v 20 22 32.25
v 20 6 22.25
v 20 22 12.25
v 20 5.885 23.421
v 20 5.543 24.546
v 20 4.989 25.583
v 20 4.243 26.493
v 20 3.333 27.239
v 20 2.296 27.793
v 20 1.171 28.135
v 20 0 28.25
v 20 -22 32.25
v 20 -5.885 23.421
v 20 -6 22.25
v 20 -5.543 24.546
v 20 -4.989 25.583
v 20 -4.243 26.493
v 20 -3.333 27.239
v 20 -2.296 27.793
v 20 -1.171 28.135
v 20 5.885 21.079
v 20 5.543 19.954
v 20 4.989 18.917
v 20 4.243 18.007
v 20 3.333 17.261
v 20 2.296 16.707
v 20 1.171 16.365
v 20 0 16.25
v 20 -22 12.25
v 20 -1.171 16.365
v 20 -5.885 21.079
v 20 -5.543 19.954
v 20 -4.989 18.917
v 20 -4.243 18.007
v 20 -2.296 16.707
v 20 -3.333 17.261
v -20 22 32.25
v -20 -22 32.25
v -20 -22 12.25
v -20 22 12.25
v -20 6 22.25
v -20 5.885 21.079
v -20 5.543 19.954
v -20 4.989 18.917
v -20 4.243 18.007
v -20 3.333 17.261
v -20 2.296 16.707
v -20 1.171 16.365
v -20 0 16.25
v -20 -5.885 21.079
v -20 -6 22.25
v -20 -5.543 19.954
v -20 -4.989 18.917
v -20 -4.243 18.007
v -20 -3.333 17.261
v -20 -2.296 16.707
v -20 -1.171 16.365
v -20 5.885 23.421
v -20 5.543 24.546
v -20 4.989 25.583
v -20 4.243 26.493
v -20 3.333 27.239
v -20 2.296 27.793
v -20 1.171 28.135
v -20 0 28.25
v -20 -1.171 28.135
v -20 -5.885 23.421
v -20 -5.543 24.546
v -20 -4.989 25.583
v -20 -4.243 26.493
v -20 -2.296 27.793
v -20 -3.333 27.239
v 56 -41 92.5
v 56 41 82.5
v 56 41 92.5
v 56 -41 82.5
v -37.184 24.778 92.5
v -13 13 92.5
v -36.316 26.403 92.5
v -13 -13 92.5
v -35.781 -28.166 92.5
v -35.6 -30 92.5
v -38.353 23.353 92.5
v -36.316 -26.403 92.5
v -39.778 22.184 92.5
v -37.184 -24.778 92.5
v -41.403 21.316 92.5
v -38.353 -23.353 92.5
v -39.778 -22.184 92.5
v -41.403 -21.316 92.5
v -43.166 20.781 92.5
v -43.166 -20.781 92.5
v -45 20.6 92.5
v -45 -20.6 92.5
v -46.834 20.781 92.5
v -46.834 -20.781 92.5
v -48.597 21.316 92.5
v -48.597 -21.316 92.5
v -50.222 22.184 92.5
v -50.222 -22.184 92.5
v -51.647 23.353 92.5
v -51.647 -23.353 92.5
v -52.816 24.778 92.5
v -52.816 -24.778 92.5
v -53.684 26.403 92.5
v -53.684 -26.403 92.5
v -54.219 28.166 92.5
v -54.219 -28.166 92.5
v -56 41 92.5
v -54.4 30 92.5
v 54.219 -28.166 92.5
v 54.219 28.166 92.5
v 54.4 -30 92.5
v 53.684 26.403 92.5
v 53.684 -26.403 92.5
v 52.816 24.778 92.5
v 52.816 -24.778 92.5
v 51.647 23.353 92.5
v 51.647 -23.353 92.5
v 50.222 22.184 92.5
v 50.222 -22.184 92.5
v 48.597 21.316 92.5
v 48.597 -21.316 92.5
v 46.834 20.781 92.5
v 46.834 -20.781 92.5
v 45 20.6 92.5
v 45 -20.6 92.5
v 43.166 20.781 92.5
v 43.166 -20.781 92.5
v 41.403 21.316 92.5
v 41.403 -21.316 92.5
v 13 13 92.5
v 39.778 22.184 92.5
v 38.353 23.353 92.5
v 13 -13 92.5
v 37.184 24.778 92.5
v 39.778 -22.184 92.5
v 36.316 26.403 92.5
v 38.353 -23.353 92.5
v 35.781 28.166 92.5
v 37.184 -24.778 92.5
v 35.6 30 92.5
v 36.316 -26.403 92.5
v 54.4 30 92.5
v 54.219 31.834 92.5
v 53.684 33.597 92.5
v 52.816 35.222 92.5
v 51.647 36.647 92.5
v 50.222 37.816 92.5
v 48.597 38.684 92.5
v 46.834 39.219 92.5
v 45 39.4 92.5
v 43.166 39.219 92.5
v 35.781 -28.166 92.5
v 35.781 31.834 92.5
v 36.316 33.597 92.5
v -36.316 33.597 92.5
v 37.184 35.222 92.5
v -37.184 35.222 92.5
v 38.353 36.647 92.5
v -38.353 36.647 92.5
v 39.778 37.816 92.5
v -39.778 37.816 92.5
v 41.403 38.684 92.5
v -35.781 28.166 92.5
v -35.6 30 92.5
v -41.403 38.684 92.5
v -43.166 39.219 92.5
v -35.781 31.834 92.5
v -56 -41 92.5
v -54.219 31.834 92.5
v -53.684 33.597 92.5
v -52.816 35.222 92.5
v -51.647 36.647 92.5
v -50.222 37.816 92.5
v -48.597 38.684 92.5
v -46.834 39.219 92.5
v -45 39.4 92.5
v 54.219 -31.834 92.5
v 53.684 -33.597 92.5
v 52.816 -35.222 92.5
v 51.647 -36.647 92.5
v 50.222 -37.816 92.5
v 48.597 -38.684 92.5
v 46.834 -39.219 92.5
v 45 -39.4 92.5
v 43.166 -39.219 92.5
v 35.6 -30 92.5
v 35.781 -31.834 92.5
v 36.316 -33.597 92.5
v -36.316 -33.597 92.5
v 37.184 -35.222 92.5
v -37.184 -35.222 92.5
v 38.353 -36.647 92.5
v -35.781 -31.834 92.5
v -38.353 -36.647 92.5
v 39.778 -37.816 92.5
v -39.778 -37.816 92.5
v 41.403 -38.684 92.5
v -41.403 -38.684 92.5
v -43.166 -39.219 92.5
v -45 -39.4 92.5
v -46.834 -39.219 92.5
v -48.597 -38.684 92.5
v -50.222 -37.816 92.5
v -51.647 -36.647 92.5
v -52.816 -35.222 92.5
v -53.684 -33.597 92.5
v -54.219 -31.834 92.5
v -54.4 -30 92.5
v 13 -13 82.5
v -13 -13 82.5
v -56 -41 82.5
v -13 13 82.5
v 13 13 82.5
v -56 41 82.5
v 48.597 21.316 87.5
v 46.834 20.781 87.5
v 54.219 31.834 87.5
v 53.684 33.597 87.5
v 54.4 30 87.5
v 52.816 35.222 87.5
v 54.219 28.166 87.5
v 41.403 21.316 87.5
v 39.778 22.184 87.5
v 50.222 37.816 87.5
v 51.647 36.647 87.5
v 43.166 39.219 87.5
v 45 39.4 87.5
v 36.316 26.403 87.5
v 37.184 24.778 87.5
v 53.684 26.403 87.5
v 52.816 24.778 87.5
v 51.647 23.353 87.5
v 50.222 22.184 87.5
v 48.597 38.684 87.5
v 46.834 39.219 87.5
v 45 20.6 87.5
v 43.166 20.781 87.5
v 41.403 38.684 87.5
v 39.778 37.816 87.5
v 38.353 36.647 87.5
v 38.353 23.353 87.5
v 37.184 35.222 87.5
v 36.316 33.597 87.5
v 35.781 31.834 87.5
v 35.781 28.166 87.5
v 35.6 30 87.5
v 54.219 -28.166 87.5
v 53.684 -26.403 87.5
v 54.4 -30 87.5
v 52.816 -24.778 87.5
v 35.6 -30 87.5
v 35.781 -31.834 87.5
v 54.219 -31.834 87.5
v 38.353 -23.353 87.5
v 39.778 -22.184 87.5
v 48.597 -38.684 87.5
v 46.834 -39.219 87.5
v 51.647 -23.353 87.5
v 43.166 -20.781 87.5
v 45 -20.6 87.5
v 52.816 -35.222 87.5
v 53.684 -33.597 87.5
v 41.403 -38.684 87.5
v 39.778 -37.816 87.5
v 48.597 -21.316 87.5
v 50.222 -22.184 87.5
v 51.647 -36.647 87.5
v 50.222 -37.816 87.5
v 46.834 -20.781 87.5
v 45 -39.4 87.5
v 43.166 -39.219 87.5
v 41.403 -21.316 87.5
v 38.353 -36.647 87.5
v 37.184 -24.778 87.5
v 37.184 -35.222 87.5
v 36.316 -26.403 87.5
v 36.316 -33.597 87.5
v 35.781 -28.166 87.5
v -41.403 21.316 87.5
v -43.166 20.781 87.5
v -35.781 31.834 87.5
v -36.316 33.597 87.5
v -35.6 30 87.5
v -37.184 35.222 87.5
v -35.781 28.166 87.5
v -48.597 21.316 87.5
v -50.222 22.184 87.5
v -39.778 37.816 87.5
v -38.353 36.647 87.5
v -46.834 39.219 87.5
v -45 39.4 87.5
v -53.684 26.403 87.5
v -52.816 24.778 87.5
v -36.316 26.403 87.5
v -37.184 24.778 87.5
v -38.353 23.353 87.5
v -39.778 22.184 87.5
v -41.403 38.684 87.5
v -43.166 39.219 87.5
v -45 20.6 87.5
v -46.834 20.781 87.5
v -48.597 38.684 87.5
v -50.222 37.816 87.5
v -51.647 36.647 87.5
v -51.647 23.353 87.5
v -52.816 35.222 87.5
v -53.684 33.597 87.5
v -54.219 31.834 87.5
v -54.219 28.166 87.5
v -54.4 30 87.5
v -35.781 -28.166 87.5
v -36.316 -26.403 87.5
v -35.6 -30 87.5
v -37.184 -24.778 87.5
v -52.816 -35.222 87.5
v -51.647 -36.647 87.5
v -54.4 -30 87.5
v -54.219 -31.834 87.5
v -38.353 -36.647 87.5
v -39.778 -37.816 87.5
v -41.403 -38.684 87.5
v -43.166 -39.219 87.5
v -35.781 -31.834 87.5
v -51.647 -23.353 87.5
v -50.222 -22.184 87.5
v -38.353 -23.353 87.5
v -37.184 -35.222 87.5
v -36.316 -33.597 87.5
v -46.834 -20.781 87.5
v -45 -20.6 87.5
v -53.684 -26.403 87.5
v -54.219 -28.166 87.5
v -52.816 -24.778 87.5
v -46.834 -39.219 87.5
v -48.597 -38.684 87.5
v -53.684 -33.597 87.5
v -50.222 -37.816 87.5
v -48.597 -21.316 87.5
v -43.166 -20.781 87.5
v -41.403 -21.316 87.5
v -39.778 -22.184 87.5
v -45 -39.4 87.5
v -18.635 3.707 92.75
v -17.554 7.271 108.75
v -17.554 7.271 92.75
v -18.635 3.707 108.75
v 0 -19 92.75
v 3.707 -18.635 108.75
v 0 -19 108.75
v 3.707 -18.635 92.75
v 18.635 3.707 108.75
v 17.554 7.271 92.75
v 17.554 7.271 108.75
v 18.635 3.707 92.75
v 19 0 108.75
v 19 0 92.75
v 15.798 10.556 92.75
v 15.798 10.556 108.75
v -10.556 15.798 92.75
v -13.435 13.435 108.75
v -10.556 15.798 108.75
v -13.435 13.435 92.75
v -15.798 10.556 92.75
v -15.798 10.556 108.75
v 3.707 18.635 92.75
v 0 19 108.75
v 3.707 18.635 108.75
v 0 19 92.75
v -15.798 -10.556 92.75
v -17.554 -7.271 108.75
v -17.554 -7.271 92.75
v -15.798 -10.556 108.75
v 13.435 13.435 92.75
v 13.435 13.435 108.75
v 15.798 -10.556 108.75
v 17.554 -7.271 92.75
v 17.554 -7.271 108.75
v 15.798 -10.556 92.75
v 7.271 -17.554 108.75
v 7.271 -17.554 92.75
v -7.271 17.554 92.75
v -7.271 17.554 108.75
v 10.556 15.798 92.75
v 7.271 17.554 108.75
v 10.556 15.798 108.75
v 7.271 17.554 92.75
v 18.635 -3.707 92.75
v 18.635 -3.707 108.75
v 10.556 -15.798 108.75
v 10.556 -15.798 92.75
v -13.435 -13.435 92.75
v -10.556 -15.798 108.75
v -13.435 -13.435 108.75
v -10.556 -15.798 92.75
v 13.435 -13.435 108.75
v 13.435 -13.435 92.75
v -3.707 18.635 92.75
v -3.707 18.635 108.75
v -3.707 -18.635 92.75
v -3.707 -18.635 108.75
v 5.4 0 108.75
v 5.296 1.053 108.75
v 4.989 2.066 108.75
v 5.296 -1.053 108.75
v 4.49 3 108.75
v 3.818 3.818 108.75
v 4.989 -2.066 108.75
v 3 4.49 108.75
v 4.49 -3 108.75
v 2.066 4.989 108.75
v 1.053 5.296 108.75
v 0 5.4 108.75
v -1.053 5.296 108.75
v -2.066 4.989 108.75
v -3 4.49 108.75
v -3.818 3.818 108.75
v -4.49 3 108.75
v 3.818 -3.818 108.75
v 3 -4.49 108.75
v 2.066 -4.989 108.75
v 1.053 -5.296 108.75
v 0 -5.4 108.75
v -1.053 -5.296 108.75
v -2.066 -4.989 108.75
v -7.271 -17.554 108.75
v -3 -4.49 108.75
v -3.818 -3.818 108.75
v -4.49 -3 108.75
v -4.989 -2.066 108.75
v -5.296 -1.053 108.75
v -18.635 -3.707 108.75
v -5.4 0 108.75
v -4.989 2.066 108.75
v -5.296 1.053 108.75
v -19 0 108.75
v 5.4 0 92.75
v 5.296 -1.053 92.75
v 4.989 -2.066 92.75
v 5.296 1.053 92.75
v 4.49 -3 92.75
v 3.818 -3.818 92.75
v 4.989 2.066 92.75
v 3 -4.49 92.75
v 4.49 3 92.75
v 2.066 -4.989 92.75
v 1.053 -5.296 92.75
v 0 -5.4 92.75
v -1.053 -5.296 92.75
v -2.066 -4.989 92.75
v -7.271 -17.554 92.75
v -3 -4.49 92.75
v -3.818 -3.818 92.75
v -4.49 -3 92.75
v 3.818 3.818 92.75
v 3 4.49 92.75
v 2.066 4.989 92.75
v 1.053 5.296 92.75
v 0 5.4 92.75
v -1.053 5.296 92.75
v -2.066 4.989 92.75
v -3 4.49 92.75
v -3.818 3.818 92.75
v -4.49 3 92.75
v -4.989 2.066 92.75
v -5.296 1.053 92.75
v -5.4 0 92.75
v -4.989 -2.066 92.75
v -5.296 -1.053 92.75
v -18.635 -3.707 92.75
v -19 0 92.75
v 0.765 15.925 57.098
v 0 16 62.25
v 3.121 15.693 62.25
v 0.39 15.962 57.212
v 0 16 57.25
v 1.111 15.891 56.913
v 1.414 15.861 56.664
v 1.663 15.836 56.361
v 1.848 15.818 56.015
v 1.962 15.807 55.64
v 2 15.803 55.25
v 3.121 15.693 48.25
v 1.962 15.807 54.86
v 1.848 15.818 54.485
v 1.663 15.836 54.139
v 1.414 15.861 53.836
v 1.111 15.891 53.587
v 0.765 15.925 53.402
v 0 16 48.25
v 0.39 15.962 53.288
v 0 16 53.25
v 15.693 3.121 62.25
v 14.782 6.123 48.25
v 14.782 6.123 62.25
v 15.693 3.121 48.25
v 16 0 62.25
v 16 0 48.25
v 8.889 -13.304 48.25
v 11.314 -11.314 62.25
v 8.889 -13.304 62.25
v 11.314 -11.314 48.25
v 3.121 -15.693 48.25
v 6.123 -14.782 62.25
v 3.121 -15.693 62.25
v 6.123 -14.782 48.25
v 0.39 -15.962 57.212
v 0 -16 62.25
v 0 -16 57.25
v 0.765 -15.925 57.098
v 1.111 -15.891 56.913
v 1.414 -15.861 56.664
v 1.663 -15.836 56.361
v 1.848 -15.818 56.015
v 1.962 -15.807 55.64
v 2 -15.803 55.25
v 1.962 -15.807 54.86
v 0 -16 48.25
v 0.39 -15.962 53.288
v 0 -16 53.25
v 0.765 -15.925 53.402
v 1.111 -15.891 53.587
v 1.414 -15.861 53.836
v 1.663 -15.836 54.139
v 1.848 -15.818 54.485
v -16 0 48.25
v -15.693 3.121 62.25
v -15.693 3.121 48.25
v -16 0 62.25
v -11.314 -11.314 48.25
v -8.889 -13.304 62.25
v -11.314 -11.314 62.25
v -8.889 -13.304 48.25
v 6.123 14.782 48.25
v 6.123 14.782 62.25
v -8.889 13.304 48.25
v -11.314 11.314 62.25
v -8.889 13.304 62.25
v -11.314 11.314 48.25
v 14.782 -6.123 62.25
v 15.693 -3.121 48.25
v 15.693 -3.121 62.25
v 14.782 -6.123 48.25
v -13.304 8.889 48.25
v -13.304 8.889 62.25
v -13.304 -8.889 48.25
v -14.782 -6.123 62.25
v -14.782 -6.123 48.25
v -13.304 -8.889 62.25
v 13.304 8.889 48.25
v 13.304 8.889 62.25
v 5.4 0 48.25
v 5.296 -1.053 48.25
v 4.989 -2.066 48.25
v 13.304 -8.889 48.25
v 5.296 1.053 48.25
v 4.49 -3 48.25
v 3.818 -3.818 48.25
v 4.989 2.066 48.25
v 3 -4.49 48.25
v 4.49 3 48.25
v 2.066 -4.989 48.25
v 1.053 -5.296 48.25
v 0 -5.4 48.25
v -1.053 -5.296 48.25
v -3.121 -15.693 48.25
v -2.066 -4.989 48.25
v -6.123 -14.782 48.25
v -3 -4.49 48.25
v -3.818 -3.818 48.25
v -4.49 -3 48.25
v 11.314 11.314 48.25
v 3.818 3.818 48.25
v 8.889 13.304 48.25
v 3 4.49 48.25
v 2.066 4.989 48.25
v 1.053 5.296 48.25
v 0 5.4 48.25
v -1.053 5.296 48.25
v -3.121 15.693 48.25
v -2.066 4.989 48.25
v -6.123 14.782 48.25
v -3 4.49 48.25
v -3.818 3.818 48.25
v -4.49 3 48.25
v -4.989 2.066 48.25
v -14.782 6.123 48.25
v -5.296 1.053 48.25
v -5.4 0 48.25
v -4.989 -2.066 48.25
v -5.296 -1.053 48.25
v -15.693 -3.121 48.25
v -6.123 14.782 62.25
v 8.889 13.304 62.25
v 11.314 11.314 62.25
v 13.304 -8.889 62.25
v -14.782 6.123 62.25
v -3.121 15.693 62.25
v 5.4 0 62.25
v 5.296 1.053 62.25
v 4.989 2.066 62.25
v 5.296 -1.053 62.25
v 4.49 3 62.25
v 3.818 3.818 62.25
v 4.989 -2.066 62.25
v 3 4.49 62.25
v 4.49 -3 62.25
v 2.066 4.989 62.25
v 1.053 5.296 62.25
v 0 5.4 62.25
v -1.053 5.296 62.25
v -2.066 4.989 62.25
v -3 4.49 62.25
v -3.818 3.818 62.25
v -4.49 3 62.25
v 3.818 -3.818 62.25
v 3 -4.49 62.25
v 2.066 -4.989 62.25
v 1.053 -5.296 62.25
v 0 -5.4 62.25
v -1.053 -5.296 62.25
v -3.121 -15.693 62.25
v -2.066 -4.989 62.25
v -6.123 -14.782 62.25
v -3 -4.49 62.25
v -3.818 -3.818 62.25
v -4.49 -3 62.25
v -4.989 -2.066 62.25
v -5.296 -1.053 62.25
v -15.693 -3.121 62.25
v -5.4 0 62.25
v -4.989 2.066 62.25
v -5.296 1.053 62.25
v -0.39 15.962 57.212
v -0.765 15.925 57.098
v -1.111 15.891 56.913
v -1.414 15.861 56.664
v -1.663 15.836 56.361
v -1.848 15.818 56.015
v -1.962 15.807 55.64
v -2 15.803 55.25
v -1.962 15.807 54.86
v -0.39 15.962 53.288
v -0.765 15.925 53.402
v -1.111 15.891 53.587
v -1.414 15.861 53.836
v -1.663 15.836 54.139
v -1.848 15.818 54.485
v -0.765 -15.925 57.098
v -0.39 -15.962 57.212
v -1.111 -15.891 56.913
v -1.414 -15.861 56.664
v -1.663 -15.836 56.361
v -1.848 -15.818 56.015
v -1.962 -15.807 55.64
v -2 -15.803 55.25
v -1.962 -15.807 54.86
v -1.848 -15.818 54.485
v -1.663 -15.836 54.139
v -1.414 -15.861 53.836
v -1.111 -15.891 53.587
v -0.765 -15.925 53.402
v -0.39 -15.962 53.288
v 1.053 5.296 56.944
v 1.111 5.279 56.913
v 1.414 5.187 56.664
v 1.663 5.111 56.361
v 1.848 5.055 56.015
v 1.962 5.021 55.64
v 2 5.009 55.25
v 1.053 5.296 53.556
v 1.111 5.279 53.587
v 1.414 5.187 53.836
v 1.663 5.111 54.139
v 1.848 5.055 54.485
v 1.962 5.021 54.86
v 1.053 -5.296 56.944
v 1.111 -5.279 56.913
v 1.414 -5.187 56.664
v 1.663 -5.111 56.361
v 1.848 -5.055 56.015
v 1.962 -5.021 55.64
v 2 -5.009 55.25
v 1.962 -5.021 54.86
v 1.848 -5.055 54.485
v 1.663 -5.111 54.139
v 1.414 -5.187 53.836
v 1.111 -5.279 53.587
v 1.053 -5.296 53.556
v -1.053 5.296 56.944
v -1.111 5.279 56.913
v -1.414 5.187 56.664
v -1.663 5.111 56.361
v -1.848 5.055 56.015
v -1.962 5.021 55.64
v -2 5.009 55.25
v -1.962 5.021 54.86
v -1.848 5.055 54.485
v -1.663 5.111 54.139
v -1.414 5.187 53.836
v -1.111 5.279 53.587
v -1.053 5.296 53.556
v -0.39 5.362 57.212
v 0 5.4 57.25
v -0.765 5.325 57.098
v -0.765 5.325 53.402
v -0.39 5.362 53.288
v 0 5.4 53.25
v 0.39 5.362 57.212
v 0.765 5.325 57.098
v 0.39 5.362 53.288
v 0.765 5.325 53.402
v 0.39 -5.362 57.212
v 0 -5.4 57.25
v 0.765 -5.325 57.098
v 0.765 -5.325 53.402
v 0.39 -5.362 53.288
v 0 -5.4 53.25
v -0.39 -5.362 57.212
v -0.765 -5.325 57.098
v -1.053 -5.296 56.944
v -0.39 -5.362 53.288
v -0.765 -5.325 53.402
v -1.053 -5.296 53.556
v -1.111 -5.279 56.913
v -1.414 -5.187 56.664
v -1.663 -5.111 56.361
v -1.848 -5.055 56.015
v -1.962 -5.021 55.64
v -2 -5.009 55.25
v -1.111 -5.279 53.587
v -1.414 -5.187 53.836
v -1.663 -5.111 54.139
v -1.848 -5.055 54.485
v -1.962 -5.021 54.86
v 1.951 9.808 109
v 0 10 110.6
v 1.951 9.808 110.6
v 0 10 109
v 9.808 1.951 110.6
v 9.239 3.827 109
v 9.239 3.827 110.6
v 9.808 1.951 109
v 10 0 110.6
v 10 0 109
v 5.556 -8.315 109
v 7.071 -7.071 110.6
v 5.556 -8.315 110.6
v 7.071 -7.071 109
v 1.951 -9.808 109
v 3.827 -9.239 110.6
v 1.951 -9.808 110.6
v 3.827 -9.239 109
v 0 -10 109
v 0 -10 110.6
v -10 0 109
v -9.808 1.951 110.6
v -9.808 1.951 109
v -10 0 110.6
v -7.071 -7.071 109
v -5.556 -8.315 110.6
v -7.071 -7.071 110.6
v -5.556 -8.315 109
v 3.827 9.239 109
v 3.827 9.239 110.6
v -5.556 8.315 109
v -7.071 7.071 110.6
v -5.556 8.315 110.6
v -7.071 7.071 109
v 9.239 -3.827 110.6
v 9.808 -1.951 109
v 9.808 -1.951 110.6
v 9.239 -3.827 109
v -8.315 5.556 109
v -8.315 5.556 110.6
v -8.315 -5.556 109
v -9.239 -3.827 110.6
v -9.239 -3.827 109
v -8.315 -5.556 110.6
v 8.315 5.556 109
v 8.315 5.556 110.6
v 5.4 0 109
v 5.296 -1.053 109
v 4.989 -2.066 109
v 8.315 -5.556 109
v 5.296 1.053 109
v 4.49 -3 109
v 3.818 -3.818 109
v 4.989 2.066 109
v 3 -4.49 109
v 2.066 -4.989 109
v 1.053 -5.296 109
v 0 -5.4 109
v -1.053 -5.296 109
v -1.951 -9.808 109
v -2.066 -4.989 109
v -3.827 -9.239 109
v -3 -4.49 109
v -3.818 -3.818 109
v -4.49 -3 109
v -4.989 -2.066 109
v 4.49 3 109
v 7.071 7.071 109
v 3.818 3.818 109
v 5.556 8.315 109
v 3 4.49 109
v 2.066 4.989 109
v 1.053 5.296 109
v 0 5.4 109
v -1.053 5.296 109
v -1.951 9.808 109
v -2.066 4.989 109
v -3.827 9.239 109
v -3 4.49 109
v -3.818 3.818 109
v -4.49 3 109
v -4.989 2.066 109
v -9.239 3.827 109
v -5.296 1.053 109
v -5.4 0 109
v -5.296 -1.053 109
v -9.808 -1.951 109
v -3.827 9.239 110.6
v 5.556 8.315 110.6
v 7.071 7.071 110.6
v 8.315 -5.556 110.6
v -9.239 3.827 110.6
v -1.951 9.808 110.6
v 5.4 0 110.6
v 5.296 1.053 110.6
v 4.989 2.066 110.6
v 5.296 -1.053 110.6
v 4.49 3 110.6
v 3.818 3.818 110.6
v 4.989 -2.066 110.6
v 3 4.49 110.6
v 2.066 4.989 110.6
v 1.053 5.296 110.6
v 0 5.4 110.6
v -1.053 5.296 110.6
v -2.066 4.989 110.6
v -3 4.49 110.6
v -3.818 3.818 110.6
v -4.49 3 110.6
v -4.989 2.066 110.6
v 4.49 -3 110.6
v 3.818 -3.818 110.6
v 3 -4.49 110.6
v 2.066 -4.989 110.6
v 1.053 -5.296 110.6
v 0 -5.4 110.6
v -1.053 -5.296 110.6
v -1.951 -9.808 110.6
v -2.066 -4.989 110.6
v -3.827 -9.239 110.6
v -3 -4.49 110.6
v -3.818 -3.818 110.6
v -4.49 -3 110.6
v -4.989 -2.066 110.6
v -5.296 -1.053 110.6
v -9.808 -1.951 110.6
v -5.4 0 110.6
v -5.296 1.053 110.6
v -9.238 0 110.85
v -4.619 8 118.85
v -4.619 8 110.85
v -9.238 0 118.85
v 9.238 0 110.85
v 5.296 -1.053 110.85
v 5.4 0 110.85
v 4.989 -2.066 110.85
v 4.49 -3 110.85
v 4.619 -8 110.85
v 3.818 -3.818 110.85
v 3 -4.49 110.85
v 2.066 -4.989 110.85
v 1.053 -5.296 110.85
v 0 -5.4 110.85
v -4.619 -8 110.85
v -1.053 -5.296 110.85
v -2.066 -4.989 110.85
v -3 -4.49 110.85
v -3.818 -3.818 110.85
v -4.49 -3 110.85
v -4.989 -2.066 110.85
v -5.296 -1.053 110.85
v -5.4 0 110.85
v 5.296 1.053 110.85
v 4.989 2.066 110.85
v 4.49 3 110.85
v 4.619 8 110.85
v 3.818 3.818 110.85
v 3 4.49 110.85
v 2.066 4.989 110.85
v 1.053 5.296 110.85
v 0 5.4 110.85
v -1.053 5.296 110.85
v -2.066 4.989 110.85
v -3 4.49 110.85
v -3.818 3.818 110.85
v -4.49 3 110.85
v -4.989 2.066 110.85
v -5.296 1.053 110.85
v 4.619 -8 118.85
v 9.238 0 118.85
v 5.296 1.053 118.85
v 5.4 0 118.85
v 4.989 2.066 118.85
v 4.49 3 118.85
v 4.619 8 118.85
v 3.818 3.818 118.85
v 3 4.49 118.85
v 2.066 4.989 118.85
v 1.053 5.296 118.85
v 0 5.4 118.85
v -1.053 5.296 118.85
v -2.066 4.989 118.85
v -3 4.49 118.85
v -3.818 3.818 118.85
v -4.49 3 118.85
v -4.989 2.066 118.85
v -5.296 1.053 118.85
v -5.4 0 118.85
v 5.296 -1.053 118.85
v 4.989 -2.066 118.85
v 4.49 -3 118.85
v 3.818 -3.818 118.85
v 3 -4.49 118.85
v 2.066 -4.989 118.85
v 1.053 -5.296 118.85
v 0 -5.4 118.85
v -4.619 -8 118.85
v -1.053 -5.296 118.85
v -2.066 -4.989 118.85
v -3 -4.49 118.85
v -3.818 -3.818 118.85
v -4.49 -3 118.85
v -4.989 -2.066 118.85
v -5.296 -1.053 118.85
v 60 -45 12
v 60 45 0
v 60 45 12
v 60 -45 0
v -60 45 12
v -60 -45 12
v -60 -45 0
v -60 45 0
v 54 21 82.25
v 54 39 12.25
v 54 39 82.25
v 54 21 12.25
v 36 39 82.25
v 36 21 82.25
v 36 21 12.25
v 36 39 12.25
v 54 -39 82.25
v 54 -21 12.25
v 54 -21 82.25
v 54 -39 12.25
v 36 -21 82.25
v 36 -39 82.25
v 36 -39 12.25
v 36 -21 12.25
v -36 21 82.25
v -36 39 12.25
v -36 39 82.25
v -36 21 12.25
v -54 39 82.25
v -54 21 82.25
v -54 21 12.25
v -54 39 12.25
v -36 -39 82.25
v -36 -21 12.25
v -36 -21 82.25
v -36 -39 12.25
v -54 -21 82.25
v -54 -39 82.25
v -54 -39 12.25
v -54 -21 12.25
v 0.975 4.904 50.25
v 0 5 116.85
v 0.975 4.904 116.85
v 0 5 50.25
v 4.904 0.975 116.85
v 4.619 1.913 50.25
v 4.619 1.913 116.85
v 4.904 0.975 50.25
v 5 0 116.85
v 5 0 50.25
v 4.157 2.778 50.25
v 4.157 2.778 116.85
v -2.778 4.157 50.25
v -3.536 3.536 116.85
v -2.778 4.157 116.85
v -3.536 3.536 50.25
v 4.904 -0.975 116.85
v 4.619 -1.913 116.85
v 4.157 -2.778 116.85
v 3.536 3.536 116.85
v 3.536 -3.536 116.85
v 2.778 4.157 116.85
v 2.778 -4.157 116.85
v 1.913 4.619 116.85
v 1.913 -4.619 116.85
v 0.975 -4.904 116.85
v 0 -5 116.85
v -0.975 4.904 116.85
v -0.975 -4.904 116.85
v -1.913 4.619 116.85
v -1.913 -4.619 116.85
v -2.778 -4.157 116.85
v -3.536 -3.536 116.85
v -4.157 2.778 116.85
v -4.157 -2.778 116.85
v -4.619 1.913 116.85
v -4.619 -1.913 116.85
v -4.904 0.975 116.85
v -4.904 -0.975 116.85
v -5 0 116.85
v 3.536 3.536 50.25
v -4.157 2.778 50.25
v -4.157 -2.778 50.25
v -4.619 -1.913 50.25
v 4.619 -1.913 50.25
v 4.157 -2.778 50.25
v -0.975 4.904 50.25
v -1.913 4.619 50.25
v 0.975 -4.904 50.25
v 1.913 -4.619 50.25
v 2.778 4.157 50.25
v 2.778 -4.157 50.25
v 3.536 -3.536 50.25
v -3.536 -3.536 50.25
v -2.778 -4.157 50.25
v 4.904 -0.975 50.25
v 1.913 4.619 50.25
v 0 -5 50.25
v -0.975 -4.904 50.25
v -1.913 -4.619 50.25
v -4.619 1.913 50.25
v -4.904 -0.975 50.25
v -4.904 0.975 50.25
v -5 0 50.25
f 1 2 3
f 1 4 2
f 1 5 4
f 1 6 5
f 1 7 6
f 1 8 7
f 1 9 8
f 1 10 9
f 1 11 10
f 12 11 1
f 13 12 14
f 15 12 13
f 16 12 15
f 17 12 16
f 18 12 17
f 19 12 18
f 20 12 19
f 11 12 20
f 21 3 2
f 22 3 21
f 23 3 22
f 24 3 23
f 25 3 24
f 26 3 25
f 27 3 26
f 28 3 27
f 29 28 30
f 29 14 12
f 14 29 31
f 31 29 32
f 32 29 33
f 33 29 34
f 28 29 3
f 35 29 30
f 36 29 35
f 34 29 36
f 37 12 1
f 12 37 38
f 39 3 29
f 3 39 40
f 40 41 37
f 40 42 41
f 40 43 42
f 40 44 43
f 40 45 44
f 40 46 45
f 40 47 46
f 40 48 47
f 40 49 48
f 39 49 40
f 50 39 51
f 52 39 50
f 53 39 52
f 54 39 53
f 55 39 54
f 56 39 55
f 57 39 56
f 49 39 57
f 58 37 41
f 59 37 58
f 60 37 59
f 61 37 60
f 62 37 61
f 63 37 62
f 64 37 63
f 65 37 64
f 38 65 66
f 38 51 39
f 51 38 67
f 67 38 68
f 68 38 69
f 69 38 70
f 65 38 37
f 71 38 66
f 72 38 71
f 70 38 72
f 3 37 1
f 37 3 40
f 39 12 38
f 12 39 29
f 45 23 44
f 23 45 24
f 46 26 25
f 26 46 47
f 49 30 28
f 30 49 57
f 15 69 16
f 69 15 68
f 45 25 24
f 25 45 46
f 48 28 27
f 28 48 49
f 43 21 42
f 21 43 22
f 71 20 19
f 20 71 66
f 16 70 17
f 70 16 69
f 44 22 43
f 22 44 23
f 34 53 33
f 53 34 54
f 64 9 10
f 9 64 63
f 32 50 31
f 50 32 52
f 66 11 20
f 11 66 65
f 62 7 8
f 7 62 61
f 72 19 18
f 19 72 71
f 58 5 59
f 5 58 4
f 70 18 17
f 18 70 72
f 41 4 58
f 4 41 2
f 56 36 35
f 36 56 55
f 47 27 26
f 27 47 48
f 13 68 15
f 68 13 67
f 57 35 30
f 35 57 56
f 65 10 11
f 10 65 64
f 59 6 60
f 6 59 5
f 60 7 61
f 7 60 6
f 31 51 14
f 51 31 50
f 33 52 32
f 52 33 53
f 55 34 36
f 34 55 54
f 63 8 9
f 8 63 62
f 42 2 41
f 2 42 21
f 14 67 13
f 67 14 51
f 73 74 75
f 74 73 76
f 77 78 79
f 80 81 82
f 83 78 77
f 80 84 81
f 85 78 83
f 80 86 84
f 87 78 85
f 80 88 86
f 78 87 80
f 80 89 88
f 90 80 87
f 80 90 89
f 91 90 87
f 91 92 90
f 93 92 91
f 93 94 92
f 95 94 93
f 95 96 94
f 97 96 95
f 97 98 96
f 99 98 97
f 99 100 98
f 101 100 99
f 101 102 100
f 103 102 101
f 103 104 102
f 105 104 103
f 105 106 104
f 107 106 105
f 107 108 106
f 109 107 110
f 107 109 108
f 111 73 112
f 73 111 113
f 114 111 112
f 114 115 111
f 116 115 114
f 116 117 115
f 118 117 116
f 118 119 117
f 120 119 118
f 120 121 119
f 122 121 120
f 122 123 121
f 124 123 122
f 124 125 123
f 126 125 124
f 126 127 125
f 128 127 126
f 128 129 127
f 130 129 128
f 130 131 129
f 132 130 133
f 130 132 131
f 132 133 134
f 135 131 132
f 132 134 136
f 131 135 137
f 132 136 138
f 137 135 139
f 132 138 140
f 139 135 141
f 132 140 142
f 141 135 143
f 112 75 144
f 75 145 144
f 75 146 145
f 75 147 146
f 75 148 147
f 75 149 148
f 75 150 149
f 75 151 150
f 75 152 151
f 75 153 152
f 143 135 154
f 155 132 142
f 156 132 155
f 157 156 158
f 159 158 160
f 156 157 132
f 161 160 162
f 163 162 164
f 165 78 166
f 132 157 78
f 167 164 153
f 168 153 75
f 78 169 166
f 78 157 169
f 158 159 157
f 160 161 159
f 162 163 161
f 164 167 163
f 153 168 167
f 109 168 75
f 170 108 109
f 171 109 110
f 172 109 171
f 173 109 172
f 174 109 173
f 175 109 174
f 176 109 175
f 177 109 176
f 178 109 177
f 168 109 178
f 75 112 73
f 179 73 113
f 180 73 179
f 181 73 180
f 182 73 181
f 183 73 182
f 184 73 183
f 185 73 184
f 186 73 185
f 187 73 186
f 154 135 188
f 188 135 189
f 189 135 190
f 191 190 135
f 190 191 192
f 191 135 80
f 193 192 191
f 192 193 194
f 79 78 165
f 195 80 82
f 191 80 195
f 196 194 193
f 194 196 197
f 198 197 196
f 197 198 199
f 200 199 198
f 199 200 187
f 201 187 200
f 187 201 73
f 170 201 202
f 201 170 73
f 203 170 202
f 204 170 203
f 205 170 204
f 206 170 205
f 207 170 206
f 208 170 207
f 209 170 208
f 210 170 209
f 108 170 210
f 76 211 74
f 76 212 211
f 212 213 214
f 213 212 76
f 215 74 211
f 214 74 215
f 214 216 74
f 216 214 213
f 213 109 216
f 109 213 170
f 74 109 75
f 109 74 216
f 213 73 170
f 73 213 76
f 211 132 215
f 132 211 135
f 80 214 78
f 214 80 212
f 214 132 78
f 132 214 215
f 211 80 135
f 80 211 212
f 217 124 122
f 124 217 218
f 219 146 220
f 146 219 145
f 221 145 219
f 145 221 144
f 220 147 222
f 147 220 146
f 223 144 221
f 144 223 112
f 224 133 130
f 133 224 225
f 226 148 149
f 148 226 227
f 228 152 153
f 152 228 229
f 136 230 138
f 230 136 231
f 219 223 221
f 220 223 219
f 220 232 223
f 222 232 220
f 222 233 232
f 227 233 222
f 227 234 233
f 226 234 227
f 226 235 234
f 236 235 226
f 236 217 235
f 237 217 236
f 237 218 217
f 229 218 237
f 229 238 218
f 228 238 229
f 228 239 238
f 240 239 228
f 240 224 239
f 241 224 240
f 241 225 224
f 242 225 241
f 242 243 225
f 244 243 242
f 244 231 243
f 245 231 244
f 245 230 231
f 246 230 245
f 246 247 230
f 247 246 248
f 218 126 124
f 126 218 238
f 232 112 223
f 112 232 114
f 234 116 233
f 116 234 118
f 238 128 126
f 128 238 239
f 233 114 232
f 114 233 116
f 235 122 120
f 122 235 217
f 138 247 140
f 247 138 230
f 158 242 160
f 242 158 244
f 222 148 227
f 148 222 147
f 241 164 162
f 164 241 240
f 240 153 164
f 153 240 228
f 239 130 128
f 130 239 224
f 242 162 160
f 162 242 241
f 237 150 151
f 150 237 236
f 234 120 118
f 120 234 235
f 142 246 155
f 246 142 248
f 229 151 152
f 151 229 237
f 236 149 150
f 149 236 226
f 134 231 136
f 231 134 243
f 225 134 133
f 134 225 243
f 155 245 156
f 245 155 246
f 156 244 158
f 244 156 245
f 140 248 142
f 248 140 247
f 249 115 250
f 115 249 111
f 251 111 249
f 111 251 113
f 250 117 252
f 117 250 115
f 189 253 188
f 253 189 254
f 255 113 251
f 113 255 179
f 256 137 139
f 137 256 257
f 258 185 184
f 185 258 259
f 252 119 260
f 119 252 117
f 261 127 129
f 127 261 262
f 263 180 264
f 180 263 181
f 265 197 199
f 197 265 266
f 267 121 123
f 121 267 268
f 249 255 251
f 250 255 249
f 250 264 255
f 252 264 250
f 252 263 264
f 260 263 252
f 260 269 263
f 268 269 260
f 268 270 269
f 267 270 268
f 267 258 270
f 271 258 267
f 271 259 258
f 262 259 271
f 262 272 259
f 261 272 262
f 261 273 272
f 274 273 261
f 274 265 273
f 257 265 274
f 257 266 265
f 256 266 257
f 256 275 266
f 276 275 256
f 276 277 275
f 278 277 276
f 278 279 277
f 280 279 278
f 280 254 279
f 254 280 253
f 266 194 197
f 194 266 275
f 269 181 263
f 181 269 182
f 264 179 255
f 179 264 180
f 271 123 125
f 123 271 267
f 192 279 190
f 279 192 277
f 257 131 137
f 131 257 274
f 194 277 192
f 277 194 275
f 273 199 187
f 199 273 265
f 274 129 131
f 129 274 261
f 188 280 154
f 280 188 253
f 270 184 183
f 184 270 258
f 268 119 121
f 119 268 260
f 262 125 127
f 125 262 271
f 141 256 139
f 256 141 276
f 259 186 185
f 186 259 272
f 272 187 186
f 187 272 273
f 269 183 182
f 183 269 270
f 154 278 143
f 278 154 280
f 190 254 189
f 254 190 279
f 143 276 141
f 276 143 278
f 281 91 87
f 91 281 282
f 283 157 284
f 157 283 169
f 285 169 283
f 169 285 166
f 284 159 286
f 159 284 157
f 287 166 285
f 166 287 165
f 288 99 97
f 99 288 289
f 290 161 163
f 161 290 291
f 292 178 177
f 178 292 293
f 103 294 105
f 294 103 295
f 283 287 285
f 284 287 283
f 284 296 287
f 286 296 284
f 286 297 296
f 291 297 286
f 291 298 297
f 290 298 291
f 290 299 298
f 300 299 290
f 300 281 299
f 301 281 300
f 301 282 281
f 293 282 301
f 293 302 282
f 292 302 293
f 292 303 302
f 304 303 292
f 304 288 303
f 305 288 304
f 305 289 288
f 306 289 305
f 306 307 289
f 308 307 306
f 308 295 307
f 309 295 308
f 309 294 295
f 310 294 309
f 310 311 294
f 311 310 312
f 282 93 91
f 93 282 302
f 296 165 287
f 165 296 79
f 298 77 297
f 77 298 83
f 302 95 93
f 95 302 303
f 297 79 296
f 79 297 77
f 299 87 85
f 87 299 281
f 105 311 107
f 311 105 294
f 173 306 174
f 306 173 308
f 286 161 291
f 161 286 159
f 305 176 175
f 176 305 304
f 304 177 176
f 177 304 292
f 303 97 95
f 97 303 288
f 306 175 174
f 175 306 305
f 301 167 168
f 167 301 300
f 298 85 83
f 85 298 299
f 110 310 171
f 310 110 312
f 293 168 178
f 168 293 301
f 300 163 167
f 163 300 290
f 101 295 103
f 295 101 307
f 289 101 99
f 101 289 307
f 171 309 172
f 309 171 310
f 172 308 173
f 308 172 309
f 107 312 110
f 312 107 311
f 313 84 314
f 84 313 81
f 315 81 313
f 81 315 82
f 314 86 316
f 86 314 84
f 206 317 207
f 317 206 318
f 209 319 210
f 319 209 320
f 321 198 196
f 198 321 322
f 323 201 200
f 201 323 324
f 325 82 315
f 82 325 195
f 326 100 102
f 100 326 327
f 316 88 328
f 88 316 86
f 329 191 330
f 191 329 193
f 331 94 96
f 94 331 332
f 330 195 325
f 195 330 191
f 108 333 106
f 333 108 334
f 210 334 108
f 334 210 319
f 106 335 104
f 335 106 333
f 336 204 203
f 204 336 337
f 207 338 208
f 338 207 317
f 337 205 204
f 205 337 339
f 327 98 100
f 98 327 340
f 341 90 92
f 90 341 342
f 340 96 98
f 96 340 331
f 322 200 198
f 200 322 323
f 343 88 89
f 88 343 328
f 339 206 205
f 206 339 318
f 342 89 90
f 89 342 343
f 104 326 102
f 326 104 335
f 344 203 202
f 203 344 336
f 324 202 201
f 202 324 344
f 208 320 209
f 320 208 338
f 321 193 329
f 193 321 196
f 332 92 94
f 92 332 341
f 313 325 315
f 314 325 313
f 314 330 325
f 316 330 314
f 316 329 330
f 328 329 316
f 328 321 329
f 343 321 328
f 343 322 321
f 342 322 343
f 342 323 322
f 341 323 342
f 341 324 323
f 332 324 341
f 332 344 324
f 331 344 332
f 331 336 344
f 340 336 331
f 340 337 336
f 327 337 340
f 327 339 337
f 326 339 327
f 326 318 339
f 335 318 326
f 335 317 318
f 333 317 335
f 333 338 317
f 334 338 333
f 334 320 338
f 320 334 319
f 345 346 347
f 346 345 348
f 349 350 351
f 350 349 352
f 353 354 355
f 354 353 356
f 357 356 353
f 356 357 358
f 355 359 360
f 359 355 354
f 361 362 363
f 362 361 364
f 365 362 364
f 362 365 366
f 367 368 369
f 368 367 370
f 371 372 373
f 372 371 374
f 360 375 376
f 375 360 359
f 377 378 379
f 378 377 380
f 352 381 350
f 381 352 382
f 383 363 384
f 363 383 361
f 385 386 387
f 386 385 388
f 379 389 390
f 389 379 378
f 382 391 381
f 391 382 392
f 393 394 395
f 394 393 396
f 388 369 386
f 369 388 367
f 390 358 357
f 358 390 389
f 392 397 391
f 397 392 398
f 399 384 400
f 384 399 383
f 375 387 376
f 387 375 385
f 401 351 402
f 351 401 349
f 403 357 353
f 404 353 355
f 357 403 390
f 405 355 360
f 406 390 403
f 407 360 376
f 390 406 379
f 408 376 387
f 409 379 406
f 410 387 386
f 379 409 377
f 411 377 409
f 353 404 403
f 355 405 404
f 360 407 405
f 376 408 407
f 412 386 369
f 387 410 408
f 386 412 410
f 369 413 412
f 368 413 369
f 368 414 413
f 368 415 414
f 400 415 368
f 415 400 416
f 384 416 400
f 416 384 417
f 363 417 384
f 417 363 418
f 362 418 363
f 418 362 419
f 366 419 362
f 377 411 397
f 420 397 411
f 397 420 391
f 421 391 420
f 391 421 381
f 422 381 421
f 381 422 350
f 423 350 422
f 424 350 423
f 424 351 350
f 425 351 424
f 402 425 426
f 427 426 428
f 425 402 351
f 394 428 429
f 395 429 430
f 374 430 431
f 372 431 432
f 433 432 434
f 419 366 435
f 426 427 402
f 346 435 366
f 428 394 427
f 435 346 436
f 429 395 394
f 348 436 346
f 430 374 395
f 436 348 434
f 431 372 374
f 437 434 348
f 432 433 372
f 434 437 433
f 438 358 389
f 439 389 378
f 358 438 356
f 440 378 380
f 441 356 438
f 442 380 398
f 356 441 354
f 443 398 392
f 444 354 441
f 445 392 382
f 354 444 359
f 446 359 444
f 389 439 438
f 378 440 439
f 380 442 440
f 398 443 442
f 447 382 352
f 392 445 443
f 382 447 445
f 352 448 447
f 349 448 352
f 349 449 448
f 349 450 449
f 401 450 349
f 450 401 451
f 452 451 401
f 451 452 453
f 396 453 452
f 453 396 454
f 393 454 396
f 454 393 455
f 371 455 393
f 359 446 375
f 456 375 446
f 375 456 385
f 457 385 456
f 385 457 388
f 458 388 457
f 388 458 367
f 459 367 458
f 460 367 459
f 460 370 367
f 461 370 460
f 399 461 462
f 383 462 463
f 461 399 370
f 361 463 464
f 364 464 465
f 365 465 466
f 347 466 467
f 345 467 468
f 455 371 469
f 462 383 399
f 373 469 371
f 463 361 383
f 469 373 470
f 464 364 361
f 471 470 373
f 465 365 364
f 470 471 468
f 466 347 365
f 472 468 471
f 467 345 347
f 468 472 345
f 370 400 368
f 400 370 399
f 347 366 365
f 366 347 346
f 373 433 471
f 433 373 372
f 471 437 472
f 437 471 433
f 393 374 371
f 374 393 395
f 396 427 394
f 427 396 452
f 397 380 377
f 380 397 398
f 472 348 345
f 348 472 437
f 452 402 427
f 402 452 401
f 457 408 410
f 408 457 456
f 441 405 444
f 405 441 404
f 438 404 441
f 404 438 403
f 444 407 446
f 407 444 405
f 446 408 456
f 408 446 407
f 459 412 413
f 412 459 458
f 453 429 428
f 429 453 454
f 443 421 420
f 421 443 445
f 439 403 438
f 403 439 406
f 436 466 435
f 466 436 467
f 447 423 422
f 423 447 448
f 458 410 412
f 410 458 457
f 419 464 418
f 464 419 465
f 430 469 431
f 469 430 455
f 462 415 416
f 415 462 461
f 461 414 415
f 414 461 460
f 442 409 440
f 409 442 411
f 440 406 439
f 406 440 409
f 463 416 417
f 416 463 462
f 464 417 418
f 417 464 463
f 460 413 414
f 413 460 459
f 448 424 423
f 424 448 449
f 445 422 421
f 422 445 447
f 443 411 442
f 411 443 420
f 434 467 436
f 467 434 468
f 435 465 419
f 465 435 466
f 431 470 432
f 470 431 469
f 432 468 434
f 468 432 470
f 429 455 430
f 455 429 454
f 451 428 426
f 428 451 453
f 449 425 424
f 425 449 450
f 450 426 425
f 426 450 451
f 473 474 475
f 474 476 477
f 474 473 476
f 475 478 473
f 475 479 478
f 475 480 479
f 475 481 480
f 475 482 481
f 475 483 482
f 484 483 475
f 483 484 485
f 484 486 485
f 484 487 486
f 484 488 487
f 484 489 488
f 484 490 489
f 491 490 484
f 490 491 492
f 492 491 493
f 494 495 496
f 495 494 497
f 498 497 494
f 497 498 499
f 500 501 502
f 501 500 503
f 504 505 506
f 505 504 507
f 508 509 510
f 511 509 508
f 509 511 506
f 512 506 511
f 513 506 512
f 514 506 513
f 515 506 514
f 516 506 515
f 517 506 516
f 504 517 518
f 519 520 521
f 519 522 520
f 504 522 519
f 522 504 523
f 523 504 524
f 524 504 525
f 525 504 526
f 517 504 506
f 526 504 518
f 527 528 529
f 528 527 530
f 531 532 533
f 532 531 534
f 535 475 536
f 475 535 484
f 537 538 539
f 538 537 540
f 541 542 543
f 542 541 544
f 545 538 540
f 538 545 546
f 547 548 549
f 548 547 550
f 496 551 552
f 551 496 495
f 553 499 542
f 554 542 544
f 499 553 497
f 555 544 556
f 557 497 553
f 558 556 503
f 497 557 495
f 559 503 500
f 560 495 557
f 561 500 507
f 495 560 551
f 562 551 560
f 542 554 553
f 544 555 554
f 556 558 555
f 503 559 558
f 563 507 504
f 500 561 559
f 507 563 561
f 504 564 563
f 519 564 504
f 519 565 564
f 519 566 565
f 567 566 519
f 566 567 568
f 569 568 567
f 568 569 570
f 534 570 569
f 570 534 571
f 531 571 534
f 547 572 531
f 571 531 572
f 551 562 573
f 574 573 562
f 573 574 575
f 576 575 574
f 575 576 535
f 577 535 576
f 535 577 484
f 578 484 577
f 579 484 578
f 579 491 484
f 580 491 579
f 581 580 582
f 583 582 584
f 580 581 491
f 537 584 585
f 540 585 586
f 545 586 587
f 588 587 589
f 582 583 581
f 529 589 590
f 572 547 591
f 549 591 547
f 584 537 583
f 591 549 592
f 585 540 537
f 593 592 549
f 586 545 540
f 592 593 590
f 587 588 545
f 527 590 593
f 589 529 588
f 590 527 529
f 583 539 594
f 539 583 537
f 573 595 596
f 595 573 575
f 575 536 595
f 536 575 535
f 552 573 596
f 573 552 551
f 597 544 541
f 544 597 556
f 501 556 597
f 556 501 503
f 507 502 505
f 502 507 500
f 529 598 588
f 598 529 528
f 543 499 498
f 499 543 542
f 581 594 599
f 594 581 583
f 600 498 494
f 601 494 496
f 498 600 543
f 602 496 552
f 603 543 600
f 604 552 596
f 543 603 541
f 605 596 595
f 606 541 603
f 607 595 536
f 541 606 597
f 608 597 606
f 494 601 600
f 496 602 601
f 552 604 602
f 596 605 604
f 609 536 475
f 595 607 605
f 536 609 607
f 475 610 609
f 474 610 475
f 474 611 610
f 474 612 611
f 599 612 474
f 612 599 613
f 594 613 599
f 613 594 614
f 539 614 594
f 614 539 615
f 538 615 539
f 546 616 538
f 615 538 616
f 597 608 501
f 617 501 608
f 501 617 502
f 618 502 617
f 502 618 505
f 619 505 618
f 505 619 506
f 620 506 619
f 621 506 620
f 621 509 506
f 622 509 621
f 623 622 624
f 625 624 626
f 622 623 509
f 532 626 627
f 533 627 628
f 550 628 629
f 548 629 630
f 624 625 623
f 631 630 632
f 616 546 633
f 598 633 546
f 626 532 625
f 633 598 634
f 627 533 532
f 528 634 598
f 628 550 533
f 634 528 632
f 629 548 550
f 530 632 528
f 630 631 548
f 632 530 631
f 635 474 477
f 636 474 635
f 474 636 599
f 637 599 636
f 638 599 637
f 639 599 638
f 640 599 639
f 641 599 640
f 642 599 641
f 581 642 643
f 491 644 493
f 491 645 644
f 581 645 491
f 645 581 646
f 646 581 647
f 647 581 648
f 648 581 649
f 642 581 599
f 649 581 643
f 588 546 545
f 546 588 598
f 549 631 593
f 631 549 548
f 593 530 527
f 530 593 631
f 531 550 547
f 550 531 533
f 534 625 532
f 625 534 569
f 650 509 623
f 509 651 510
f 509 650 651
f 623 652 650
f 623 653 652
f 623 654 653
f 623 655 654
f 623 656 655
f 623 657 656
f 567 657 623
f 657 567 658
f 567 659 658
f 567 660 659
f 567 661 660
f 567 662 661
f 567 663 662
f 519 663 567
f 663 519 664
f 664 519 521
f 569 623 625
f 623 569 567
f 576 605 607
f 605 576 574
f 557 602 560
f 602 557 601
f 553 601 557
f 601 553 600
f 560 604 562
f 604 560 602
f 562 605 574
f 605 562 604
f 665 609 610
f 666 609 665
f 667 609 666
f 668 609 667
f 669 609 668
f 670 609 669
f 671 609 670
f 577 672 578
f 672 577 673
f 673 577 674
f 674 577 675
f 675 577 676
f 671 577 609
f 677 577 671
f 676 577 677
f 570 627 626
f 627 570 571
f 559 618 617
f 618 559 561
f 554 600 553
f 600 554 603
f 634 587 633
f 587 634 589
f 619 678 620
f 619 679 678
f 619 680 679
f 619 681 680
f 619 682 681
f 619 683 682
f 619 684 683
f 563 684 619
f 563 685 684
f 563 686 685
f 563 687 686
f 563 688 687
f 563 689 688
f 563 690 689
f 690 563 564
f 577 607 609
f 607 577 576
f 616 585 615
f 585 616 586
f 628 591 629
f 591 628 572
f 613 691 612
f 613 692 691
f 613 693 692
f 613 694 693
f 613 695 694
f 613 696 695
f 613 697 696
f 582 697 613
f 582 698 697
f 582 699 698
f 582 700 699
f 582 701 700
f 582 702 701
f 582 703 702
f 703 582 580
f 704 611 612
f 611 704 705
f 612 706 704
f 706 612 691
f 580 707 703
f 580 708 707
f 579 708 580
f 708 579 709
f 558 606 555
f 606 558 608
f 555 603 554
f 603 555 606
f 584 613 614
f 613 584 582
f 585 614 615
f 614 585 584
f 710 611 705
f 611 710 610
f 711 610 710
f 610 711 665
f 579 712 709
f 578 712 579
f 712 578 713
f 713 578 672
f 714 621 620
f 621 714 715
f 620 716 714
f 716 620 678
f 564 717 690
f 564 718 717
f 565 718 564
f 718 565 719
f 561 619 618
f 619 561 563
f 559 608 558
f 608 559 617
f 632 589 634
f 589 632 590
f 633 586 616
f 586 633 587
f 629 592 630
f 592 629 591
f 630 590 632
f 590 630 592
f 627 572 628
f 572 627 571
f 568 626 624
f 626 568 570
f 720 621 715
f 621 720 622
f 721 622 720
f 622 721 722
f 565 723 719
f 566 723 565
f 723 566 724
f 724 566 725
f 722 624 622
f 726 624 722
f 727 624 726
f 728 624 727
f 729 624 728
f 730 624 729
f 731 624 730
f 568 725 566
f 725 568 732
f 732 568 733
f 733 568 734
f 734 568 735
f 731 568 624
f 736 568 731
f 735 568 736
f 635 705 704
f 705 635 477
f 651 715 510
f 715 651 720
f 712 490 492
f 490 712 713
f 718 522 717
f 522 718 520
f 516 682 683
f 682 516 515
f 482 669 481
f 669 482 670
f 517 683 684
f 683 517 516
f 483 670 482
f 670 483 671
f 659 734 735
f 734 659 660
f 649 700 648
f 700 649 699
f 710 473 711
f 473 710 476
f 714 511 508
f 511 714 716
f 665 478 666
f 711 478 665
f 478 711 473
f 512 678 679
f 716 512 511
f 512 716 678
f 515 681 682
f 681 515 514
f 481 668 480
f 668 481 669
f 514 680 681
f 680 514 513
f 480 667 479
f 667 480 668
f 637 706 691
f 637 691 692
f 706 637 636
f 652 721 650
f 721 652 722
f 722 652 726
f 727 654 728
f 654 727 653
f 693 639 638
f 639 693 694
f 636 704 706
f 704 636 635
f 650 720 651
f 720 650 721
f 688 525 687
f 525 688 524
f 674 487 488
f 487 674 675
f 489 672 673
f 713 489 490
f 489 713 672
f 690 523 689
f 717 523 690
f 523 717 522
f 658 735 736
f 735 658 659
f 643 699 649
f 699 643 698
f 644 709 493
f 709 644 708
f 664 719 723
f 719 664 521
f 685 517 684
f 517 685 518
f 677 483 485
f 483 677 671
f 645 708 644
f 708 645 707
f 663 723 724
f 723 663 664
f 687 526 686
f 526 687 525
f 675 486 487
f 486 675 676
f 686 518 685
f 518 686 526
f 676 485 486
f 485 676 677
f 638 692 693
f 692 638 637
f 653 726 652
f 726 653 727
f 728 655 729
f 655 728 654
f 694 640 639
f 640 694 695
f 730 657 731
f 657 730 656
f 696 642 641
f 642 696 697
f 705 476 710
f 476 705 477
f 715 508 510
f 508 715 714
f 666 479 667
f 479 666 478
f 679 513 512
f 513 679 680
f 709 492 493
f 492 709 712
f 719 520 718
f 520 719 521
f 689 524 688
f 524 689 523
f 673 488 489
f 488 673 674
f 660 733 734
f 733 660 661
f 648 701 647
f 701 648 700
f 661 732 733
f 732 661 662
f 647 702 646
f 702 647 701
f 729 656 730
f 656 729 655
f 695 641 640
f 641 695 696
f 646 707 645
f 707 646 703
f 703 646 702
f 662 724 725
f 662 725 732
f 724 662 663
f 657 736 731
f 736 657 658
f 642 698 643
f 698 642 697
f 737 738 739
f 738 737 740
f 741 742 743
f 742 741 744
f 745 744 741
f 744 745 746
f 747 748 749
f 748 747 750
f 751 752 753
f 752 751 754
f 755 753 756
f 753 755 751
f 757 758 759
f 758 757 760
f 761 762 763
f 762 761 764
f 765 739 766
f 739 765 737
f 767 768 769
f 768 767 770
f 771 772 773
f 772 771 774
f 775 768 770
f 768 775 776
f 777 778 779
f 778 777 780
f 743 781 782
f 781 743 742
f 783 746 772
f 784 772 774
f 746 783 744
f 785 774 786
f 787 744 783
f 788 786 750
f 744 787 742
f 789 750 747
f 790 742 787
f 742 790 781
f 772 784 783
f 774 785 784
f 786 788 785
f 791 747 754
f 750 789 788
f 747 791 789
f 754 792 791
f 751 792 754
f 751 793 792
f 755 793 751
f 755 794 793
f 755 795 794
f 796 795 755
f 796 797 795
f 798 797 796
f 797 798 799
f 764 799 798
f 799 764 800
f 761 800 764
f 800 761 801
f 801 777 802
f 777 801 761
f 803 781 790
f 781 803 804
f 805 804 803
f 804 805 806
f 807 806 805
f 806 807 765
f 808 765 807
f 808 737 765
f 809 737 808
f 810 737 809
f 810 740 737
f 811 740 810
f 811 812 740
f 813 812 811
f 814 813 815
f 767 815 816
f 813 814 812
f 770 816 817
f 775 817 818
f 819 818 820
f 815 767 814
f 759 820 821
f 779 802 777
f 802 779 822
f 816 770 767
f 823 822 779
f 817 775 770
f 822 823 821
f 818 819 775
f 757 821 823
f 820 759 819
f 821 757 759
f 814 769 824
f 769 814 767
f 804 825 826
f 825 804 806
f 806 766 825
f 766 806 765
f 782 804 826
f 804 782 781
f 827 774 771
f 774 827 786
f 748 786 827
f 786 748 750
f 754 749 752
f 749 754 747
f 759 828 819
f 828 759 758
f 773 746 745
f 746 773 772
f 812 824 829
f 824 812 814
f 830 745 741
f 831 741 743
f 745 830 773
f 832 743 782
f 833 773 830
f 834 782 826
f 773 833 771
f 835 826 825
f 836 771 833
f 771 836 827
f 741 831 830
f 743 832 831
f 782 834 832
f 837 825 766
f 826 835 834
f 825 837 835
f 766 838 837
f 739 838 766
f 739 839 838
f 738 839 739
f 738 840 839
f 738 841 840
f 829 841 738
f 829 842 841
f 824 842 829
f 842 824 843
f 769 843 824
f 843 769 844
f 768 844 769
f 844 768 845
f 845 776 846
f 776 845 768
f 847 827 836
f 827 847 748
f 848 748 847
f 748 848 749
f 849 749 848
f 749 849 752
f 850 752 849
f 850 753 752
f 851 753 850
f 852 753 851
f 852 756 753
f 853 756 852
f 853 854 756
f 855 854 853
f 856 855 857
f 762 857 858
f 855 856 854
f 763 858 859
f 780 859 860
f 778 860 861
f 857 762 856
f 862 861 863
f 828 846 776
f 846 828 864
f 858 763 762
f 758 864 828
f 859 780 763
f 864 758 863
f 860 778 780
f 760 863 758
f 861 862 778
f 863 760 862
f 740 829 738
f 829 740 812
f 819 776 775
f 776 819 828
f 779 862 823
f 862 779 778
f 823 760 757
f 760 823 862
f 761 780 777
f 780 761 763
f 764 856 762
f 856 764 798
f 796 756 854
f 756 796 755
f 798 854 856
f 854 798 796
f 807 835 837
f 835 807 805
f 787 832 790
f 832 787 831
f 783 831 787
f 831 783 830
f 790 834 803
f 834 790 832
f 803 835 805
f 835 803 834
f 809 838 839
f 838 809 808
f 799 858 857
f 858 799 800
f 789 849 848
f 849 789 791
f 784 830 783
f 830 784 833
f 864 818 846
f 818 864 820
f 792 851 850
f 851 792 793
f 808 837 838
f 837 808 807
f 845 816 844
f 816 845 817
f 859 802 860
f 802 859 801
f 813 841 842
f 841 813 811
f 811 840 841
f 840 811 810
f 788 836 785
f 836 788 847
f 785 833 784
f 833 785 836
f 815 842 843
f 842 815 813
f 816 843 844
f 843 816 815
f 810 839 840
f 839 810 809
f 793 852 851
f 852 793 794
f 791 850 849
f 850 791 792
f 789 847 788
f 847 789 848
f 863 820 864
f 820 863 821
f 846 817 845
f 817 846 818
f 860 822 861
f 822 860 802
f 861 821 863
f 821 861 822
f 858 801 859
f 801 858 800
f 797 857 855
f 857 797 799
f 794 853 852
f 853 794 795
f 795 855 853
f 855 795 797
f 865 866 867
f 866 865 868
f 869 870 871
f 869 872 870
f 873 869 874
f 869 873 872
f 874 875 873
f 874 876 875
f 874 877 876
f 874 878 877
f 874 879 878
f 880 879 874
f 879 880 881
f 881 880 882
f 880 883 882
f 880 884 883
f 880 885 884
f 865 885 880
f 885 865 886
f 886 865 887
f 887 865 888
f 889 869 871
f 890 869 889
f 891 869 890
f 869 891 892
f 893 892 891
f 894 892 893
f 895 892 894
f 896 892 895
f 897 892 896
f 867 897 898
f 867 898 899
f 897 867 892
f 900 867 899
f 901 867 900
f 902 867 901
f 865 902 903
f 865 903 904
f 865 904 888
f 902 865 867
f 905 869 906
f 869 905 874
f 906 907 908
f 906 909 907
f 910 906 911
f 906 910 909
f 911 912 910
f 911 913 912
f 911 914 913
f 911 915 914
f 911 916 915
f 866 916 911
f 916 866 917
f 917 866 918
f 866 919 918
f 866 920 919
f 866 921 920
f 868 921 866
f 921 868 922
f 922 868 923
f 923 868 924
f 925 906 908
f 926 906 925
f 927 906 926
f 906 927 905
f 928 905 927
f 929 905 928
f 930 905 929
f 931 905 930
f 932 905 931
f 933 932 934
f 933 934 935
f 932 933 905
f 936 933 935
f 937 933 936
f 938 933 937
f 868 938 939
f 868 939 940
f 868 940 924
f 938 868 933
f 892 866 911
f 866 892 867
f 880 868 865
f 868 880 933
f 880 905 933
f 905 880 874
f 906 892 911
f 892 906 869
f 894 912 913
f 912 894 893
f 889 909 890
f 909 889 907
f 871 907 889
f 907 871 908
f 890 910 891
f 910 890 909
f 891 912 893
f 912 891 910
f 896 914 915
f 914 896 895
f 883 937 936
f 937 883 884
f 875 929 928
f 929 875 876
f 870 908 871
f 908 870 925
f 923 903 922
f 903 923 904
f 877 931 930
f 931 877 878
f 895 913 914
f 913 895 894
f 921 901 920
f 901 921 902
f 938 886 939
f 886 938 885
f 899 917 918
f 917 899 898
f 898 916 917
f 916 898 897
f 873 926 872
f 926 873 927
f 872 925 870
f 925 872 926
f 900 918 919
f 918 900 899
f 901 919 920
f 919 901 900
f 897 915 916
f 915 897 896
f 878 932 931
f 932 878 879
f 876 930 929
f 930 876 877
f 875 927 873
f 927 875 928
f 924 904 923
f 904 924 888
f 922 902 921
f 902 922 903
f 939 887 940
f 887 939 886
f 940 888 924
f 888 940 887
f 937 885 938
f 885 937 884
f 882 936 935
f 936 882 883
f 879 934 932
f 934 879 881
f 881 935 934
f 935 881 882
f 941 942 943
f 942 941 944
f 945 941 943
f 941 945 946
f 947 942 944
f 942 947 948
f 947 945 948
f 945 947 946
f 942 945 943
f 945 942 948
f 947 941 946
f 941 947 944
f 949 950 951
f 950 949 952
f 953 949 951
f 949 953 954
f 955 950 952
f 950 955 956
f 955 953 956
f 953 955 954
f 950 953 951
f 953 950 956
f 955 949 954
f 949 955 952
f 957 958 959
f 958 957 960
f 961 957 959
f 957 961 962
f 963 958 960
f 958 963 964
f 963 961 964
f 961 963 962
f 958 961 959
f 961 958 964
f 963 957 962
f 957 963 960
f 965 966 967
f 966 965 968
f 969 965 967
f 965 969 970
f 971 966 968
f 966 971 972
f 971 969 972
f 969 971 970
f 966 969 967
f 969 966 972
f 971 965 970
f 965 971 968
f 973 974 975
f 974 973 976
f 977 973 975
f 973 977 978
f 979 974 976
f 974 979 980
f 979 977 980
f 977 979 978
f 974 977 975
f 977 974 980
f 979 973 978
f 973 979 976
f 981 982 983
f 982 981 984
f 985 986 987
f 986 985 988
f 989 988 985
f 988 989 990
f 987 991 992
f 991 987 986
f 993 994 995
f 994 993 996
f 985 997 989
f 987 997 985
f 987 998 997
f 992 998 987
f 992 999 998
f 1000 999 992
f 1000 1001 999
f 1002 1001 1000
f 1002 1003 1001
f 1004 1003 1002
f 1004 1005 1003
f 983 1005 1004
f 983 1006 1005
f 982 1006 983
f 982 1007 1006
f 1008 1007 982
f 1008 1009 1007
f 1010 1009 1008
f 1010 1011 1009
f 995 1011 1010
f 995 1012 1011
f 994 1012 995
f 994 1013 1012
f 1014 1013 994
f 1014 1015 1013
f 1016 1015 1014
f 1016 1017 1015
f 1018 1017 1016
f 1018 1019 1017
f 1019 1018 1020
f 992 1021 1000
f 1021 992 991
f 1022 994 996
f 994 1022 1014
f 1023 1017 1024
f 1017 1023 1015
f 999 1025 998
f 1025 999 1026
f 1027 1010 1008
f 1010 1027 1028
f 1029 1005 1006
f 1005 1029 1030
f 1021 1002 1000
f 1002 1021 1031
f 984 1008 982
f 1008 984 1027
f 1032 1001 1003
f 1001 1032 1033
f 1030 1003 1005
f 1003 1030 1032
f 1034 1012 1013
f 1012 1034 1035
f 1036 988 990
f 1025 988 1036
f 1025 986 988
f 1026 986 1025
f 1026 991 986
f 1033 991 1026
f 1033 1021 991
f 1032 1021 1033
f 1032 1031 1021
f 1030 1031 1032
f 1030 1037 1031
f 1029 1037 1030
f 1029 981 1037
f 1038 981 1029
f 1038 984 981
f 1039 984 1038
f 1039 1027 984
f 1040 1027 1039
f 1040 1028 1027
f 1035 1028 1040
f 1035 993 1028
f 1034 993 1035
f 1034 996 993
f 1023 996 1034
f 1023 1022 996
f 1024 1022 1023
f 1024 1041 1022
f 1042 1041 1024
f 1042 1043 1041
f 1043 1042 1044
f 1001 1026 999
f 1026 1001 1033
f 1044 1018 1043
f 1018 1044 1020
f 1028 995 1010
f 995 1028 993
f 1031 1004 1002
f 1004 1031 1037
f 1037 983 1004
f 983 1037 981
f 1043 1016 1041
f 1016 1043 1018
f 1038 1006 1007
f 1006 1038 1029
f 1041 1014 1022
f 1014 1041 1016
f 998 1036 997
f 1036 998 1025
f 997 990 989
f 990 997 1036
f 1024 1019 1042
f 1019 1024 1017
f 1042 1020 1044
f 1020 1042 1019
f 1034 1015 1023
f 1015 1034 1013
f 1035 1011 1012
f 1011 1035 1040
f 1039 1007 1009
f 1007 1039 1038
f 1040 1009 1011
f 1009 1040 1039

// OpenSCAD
$fn = 32;

// ------------------------------------------------------------------------
// Arbor press fixture: screw d10, posts 70 mm, gap 16 mm
// Every part is its own module, assembly() places every instance.
// ------------------------------------------------------------------------

// --- part 1 ---
module press_bed() {
  difference() {
    translate([-60, -45, 0]) cube([120, 90, 12]);
  }
}

// --- part 2 ---
module anvil_block() {
  difference() {
    translate([-20, -22, 0]) cube([40, 44, 20]);
    translate([0, 0, 10]) rotate([0, 90, 0]) cylinder(h = 42, d = 12, center = true);
  }
}

// --- part 3 ---
module press_post_a() {
  translate([-9, -9, 0]) cube([18, 18, 70]);
}

// --- part 4 ---
module press_post_b() {
  translate([-9, -9, 0]) cube([18, 18, 70]);
}

// --- part 5 ---
module press_post_c() {
  translate([-9, -9, 0]) cube([18, 18, 70]);
}

// --- part 6 ---
module press_post_d() {
  translate([-9, -9, 0]) cube([18, 18, 70]);
}

// --- part 7 ---
module press_frame() {
  difference() {
    translate([-56, -41, 0]) cube([112, 82, 10]);
    translate([-13, -13, -1]) cube([26, 26, 12]);
    translate([45, 30, 5]) cylinder(h = 6, d = 18.8);
    translate([45, -30, 5]) cylinder(h = 6, d = 18.8);
    translate([-45, 30, 5]) cylinder(h = 6, d = 18.8);
    translate([-45, -30, 5]) cylinder(h = 6, d = 18.8);
  }
}

// --- part 8 ---
module guide_ring() {
  difference() {
      translate([0, 0, 0]) cylinder(h = 16, d = 38);
      translate([0, 0, -1]) cylinder(h = 18, d = 10.8);
    }
}

// --- part 9 ---
module press_screw() {
  translate([0, 0, -33.3]) cylinder(h = 66.6, d = 10);
}

// --- part 10 ---
module press_head() {
  difference() {
    cylinder(h = 14, d = 32);
    translate([0, 0, -1]) cylinder(h = 16, d = 10.8);
    translate([0, 0, 7]) rotate([90, 0, 0]) cylinder(h = 34, d = 4, center = true);
  }
}

// --- part 11 ---
module nut_washer() {
  difference() {
      translate([0, 0, 0]) cylinder(h = 1.6, d = 20);
      translate([0, 0, -1]) cylinder(h = 3.6, d = 10.8);
    }
}

// --- part 12 ---
module press_nut() {
  difference() {
    linear_extrude(height = 8) polygon(points = [[9.238, 0], [4.619, 8], [-4.619, 8], [-9.238, 0], [-4.619, -8], [4.619, -8]]);
    translate([0, 0, -1]) cylinder(h = 10, d = 10.8);
  }
}

// --- assembly ---
module assembly() {
  color([0.80, 0.24, 0.20]) translate([0, 0, 0]) rotate([0, 0, 0]) press_bed();
  color([0.20, 0.45, 0.75]) translate([0, 0, 12.25]) rotate([0, 0, 0]) anvil_block();
  color([0.25, 0.62, 0.32]) translate([45, 30, 12.25]) rotate([0, 0, 0]) press_post_a();
  color([0.92, 0.70, 0.18]) translate([45, -30, 12.25]) rotate([0, 0, 0]) press_post_b();
  color([0.58, 0.35, 0.70]) translate([-45, 30, 12.25]) rotate([0, 0, 0]) press_post_c();
  color([0.16, 0.66, 0.66]) translate([-45, -30, 12.25]) rotate([0, 0, 0]) press_post_d();
  color([0.85, 0.48, 0.18]) translate([0, 0, 82.5]) rotate([0, 0, 0]) press_frame();
  color([0.55, 0.60, 0.65]) translate([0, 0, 92.75]) rotate([0, 0, 0]) guide_ring();
  color([0.75, 0.30, 0.55]) translate([0, 0, 83.55]) rotate([0, 0, 0]) press_screw();
  color([0.42, 0.52, 0.28]) translate([0, 0, 48.25]) rotate([0, 0, 0]) press_head();
  color([0.80, 0.24, 0.20]) translate([0, 0, 109]) rotate([0, 0, 0]) nut_washer();
  color([0.20, 0.45, 0.75]) translate([0, 0, 110.85]) rotate([0, 0, 0]) press_nut();
}

assembly();
